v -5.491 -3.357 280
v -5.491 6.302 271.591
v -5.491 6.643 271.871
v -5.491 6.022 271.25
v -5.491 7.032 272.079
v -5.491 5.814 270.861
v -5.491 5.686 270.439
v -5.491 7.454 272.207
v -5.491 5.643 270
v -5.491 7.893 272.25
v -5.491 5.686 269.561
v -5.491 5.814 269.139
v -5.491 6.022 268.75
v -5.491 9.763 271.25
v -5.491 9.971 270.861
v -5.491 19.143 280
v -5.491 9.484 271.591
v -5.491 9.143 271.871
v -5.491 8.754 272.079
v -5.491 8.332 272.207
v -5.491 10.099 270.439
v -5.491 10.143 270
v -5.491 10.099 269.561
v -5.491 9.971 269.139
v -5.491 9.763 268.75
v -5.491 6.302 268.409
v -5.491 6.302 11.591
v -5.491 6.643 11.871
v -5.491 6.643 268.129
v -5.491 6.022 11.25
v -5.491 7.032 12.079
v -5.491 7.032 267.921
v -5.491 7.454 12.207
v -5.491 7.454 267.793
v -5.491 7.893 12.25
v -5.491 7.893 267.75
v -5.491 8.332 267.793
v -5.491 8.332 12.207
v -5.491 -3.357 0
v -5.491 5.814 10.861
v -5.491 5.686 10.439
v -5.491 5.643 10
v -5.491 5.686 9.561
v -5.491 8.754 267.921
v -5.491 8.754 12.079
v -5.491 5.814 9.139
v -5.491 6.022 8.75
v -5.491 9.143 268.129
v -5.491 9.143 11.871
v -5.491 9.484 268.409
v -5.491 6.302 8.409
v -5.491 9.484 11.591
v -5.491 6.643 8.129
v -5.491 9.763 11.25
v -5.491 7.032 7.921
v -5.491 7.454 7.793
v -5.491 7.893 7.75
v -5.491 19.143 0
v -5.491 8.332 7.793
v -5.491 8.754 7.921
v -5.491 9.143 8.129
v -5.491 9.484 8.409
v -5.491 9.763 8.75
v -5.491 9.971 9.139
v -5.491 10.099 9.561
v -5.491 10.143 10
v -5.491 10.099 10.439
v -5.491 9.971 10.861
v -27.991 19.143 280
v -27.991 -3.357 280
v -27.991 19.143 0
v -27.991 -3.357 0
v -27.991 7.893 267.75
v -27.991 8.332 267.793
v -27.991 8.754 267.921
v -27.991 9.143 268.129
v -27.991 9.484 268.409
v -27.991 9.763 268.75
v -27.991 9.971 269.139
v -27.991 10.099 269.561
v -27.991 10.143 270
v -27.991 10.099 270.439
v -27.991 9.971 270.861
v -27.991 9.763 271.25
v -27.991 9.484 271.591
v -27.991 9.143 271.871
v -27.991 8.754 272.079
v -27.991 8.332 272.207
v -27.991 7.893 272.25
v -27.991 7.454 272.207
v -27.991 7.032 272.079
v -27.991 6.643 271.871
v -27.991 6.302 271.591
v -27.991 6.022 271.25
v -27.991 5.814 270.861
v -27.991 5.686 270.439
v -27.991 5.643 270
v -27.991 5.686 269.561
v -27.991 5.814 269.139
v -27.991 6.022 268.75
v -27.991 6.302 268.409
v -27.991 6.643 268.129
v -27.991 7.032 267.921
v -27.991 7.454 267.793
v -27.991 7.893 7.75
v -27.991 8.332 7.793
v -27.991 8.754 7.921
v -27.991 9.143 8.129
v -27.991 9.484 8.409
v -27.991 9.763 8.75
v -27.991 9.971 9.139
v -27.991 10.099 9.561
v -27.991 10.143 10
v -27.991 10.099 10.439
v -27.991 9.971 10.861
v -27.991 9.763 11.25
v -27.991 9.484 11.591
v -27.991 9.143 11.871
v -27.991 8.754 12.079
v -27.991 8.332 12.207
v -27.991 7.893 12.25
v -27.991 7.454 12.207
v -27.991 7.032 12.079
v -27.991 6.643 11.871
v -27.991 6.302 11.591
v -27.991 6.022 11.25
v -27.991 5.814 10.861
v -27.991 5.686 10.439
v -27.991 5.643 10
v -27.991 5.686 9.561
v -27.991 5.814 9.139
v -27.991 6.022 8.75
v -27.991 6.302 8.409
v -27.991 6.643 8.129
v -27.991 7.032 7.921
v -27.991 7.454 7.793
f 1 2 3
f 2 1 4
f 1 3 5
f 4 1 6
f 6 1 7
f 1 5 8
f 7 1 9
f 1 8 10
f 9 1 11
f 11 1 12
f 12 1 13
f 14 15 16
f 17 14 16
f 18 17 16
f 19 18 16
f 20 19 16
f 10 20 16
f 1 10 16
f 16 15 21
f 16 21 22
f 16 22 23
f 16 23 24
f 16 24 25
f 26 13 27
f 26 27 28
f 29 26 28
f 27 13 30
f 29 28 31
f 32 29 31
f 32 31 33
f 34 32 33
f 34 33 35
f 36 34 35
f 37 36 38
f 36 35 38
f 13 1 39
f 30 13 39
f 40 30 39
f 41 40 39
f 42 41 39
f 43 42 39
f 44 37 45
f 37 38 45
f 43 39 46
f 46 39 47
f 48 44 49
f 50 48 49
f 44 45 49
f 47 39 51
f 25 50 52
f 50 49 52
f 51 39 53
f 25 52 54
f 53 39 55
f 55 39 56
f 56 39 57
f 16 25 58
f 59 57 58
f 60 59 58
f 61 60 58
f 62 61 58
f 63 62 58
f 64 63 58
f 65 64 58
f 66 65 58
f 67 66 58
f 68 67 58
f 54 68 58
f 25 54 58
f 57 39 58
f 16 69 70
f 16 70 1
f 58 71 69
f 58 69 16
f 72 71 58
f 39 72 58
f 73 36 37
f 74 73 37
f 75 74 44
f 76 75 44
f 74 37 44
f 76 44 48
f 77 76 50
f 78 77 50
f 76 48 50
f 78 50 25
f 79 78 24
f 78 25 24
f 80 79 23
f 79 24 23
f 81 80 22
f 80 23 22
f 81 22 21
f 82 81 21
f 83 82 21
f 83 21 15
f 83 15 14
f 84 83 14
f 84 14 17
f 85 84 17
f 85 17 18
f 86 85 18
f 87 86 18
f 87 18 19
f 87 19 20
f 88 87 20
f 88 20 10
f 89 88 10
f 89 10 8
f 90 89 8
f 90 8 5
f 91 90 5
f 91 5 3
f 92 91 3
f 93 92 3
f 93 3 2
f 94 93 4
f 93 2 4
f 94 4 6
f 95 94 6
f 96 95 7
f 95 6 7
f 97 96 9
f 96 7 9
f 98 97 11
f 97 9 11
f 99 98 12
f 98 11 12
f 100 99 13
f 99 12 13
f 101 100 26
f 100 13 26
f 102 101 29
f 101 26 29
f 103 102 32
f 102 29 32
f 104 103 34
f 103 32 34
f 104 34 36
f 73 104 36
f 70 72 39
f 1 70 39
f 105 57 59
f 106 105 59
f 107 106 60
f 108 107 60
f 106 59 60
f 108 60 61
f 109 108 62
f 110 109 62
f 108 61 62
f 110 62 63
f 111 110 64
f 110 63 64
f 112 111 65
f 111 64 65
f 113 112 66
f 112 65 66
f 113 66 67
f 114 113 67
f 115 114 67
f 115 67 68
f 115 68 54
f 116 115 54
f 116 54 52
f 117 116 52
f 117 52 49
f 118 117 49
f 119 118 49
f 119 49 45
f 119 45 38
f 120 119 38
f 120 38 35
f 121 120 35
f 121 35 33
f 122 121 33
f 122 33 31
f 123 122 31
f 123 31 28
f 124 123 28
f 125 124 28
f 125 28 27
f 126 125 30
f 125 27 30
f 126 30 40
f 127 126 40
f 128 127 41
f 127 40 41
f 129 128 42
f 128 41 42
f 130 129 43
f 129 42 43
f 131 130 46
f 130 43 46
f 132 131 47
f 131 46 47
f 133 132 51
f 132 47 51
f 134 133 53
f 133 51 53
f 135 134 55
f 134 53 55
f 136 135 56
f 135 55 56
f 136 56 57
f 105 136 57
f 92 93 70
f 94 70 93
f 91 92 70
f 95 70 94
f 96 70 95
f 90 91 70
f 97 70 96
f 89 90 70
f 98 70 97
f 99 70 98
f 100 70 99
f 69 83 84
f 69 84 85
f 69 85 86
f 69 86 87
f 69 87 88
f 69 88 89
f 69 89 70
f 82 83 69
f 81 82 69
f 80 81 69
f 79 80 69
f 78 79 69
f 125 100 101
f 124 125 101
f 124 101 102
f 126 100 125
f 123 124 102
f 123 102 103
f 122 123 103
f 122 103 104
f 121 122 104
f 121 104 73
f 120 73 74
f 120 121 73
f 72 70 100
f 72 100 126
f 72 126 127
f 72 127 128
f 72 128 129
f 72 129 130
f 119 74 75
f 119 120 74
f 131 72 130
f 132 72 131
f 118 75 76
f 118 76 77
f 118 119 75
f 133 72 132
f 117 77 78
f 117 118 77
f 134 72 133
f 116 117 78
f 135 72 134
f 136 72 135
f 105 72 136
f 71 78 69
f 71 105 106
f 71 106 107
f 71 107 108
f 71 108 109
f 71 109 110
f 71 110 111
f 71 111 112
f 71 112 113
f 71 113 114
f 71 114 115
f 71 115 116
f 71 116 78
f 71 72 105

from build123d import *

# Parameters (mm, degrees)
ESQUISSE1_W             = 22.5
ESQUISSE1_H             = 22.5
BOSS_EXTRU_1_DEPTH      = 280
ENL_V_MAT_EXTRU_1_REACH = 24.5
ESQUISSE2_R             = 2.25


with BuildPart() as part:
    # Esquisse1 → Boss.-Extru.1 (new body)
    with BuildSketch(Plane.XY):
        with Locations((-16.740565009, 7.892670157)):
            Rectangle(ESQUISSE1_W, ESQUISSE1_H)
    extrude(amount=BOSS_EXTRU_1_DEPTH)

    # Esquisse2 → Enlèv. mat.-Extru.1 (cut, up to next)
    with BuildSketch(Plane(origin=(-5.490565009, 0, 0), x_dir=(0, 0, -1), z_dir=(1, 0, 0)), mode=Mode.PRIVATE) as enl_v_mat_extru_1_sk1:
        with Locations((-270, 7.892670157)):
            Circle(ESQUISSE2_R)
    enl_v_mat_extru_1_tool1 = extrude(enl_v_mat_extru_1_sk1.sketch, amount=-ENL_V_MAT_EXTRU_1_REACH, mode=Mode.PRIVATE) & part.part
    add(enl_v_mat_extru_1_tool1.solids().sort_by_distance((-5.490565, 7.89267, 270))[0], mode=Mode.SUBTRACT)
    # Esquisse2 → Enlèv. mat.-Extru.1 (cut, up to next)
    with BuildSketch(Plane(origin=(-5.490565009, 0, 0), x_dir=(0, 0, -1), z_dir=(1, 0, 0)), mode=Mode.PRIVATE) as enl_v_mat_extru_1_sk2:
        with Locations((-10, 7.892670157)):
            Circle(ESQUISSE2_R)
    enl_v_mat_extru_1_tool2 = extrude(enl_v_mat_extru_1_sk2.sketch, amount=-ENL_V_MAT_EXTRU_1_REACH, mode=Mode.PRIVATE) & part.part
    add(enl_v_mat_extru_1_tool2.solids().sort_by_distance((-5.490565, 7.89267, 10))[0], mode=Mode.SUBTRACT)


solid = part.part
